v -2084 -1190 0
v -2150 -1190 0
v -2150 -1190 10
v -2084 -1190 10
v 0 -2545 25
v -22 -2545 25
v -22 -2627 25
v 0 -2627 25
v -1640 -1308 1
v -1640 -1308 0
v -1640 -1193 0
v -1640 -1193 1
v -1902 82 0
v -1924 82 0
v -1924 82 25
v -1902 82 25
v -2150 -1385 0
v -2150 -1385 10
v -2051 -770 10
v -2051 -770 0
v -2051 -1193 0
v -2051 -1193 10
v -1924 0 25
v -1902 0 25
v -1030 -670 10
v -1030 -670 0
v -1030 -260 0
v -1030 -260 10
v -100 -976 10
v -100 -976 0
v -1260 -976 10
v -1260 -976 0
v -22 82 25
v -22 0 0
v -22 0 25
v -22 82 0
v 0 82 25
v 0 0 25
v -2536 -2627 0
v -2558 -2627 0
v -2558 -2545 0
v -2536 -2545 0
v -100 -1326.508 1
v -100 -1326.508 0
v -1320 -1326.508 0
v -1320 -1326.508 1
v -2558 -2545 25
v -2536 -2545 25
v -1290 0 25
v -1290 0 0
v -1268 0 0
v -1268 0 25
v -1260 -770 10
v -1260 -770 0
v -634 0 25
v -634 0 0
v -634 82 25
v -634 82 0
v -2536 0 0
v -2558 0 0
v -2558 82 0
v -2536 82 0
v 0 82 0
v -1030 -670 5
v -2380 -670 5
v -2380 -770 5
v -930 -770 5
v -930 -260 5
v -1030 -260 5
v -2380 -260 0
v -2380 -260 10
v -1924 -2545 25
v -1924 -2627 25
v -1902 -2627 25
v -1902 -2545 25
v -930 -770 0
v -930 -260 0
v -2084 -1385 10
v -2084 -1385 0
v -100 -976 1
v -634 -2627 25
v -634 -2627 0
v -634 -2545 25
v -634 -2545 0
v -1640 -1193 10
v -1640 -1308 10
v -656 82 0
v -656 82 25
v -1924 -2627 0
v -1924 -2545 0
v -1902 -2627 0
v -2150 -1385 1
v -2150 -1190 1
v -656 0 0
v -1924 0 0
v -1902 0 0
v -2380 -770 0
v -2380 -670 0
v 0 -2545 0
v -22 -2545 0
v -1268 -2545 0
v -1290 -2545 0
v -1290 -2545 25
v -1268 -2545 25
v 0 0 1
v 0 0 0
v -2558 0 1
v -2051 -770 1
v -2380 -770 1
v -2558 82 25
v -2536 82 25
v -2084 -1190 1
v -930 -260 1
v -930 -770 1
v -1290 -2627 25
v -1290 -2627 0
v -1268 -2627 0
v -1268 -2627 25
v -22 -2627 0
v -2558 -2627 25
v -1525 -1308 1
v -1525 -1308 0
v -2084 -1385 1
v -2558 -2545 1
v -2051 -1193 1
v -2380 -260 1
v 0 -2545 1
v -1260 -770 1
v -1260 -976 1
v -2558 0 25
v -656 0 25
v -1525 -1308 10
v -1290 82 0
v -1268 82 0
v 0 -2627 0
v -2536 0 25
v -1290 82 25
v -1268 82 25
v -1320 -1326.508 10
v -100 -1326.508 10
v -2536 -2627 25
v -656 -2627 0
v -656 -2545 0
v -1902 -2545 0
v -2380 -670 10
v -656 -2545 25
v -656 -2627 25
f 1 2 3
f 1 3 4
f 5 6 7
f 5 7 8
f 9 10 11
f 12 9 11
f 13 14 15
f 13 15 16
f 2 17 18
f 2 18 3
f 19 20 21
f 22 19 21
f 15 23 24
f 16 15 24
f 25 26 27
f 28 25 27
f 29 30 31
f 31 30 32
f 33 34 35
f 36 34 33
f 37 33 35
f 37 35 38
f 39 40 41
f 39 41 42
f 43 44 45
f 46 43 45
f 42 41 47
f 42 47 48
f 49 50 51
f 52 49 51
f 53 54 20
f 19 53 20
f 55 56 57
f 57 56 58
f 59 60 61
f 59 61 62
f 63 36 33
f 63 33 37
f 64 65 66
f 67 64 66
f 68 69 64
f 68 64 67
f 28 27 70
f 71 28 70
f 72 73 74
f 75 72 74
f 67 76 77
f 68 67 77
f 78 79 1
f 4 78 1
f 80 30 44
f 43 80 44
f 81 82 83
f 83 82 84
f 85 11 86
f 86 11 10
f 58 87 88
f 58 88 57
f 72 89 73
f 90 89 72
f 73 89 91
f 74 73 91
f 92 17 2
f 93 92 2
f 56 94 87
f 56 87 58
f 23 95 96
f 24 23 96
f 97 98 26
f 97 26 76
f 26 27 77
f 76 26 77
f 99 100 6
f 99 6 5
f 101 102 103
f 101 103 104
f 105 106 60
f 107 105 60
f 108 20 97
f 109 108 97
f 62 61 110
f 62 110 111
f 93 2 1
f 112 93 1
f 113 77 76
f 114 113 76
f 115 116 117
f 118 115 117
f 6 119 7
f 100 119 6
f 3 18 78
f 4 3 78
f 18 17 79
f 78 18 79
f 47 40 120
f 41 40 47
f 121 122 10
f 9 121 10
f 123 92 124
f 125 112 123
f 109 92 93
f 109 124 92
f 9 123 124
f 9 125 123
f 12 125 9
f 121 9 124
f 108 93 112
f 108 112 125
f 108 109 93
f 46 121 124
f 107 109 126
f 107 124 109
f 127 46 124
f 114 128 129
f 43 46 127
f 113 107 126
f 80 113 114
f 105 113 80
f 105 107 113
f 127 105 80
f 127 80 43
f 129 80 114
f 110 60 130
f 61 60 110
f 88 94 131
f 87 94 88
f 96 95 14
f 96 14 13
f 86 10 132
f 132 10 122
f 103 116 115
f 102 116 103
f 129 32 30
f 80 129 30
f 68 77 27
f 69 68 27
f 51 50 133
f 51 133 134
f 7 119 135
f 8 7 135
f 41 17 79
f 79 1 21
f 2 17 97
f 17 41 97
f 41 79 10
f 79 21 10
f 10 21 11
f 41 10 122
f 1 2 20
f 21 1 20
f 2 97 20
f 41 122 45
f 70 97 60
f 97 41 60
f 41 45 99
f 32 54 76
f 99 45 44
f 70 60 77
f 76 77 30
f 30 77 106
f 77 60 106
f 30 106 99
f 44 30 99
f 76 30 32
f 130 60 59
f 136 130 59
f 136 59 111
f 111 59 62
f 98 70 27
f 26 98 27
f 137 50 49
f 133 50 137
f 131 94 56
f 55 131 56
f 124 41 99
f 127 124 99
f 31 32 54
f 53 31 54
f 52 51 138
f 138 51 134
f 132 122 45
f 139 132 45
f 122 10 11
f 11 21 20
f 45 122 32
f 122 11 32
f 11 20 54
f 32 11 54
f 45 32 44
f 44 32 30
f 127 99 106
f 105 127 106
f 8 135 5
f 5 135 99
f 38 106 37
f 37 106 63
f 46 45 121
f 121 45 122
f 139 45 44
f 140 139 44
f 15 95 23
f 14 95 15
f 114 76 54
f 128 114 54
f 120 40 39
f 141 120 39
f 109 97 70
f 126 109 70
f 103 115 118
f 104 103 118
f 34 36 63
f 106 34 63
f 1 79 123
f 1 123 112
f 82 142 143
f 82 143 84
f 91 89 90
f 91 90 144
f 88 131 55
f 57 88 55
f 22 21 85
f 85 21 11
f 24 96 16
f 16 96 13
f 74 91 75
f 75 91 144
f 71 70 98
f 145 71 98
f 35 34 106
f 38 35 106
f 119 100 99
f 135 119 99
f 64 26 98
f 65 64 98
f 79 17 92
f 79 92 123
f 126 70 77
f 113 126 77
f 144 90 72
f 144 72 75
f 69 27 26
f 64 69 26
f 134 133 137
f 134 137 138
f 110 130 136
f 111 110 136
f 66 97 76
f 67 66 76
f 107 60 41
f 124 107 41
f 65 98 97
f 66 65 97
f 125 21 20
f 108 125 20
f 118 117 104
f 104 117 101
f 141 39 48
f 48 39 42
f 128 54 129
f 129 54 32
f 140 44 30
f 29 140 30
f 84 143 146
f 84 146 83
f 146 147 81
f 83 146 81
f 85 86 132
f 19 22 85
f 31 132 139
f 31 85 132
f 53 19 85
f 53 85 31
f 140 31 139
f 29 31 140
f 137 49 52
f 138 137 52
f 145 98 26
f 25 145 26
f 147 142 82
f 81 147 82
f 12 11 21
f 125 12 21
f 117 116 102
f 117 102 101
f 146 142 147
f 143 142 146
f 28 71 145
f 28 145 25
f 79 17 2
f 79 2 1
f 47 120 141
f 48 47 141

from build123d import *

# Parameters (mm, degrees)
F1_DEPTH = 10
F0_W     = 66
F0_H     = 195
F2_DEPTH = 10
F3_DEPTH = 10
F0_W_2   = 22
F0_H_2   = 82
F4_DEPTH = 25
F5_DEPTH = 25
F6_DEPTH = 5
F7_DEPTH = 1


with BuildPart() as f1:
    # F0 (on Top) → F1 (new body)
    with BuildSketch(Plane.XY):
        Polygon((-1260, -976), (-1260, -770), (-2051, -770), (-2051, -1193), (-1640, -1193), (-1640, -1308), (-1525, -1308), (-1320, -1326.508403), (-100, -1326.508403), (-100, -976), align=None)
    extrude(amount=F1_DEPTH)


with BuildPart() as f2:
    # F0 (on Top) → F2 (new body)
    with BuildSketch(Plane.XY):
        with Locations((-2117, -1287.5)):
            Rectangle(F0_W, F0_H)
    extrude(amount=F2_DEPTH)


with BuildPart() as f3:
    # F0 (on Top) → F3 (new body)
    with BuildSketch(Plane.XY):
        Polygon((-1030, -670), (-1030, -260), (-2380, -260), (-2380, -670), (-2150, -670), align=None)
    extrude(amount=F3_DEPTH)


with BuildPart() as f4:
    # F0 (on Top) → F4 (new body)
    with BuildSketch(Plane.XY):
        with Locations((-2547, 41)):
            Rectangle(F0_W_2, F0_H_2)
        with Locations((-1913, 41)):
            Rectangle(F0_W_2, F0_H_2)
        with Locations((-1279, 41)):
            Rectangle(F0_W_2, F0_H_2)
        with Locations((-645, 41)):
            Rectangle(F0_W_2, F0_H_2)
        with Locations((-11, 41)):
            Rectangle(F0_W_2, F0_H_2)
    extrude(amount=F4_DEPTH)


with BuildPart() as f5:
    # F0 (on Top) → F5 (new body)
    with BuildSketch(Plane.XY):
        with Locations((-2547, -2586)):
            Rectangle(F0_W_2, F0_H_2)
        with Locations((-1913, -2586)):
            Rectangle(F0_W_2, F0_H_2)
        with Locations((-1279, -2586)):
            Rectangle(F0_W_2, F0_H_2)
        with Locations((-645, -2586)):
            Rectangle(F0_W_2, F0_H_2)
        with Locations((-11, -2586)):
            Rectangle(F0_W_2, F0_H_2)
    extrude(amount=F5_DEPTH)


with BuildPart() as f6:
    # F0 (on Top) → F6 (new body)
    with BuildSketch(Plane.XY):
        Polygon((-930, -260), (-1030, -260), (-1030, -670), (-2150, -670), (-2380, -670), (-2380, -770), (-2051, -770), (-1260, -770), (-930, -770), align=None)
    extrude(amount=F6_DEPTH)


with BuildPart() as f7:
    # F0 (on Top) → F7 (new body)
    with BuildSketch(Plane.XY):
        Polygon((0, -976), (0, 0), (-22, 0), (-634, 0), (-656, 0), (-1268, 0), (-1290, 0), (-1902, 0), (-1924, 0), (-2536, 0), (-2558, 0), (-2558, -2545), (-2536, -2545), (-1924, -2545), (-1902, -2545), (-1290, -2545), (-1268, -2545), (-656, -2545), (-634, -2545), (-22, -2545), (0, -2545), (0, -1326.508403), align=None)
        with Locations((-2117, -1287.5)):
            Rectangle(F0_W, F0_H, mode=Mode.SUBTRACT)
        Polygon((-2380, -260), (-1030, -260), (-930, -260), (-930, -770), (-1260, -770), (-1260, -976), (-100, -976), (-100, -1326.508403), (-1320, -1326.508403), (-1525, -1308), (-1640, -1308), (-1640, -1193), (-2051, -1193), (-2051, -770), (-2380, -770), (-2380, -670), align=None, mode=Mode.SUBTRACT)
    extrude(amount=F7_DEPTH)


solid = Compound([f1.part, f2.part, f3.part, f4.part, f5.part, f6.part, f7.part])
